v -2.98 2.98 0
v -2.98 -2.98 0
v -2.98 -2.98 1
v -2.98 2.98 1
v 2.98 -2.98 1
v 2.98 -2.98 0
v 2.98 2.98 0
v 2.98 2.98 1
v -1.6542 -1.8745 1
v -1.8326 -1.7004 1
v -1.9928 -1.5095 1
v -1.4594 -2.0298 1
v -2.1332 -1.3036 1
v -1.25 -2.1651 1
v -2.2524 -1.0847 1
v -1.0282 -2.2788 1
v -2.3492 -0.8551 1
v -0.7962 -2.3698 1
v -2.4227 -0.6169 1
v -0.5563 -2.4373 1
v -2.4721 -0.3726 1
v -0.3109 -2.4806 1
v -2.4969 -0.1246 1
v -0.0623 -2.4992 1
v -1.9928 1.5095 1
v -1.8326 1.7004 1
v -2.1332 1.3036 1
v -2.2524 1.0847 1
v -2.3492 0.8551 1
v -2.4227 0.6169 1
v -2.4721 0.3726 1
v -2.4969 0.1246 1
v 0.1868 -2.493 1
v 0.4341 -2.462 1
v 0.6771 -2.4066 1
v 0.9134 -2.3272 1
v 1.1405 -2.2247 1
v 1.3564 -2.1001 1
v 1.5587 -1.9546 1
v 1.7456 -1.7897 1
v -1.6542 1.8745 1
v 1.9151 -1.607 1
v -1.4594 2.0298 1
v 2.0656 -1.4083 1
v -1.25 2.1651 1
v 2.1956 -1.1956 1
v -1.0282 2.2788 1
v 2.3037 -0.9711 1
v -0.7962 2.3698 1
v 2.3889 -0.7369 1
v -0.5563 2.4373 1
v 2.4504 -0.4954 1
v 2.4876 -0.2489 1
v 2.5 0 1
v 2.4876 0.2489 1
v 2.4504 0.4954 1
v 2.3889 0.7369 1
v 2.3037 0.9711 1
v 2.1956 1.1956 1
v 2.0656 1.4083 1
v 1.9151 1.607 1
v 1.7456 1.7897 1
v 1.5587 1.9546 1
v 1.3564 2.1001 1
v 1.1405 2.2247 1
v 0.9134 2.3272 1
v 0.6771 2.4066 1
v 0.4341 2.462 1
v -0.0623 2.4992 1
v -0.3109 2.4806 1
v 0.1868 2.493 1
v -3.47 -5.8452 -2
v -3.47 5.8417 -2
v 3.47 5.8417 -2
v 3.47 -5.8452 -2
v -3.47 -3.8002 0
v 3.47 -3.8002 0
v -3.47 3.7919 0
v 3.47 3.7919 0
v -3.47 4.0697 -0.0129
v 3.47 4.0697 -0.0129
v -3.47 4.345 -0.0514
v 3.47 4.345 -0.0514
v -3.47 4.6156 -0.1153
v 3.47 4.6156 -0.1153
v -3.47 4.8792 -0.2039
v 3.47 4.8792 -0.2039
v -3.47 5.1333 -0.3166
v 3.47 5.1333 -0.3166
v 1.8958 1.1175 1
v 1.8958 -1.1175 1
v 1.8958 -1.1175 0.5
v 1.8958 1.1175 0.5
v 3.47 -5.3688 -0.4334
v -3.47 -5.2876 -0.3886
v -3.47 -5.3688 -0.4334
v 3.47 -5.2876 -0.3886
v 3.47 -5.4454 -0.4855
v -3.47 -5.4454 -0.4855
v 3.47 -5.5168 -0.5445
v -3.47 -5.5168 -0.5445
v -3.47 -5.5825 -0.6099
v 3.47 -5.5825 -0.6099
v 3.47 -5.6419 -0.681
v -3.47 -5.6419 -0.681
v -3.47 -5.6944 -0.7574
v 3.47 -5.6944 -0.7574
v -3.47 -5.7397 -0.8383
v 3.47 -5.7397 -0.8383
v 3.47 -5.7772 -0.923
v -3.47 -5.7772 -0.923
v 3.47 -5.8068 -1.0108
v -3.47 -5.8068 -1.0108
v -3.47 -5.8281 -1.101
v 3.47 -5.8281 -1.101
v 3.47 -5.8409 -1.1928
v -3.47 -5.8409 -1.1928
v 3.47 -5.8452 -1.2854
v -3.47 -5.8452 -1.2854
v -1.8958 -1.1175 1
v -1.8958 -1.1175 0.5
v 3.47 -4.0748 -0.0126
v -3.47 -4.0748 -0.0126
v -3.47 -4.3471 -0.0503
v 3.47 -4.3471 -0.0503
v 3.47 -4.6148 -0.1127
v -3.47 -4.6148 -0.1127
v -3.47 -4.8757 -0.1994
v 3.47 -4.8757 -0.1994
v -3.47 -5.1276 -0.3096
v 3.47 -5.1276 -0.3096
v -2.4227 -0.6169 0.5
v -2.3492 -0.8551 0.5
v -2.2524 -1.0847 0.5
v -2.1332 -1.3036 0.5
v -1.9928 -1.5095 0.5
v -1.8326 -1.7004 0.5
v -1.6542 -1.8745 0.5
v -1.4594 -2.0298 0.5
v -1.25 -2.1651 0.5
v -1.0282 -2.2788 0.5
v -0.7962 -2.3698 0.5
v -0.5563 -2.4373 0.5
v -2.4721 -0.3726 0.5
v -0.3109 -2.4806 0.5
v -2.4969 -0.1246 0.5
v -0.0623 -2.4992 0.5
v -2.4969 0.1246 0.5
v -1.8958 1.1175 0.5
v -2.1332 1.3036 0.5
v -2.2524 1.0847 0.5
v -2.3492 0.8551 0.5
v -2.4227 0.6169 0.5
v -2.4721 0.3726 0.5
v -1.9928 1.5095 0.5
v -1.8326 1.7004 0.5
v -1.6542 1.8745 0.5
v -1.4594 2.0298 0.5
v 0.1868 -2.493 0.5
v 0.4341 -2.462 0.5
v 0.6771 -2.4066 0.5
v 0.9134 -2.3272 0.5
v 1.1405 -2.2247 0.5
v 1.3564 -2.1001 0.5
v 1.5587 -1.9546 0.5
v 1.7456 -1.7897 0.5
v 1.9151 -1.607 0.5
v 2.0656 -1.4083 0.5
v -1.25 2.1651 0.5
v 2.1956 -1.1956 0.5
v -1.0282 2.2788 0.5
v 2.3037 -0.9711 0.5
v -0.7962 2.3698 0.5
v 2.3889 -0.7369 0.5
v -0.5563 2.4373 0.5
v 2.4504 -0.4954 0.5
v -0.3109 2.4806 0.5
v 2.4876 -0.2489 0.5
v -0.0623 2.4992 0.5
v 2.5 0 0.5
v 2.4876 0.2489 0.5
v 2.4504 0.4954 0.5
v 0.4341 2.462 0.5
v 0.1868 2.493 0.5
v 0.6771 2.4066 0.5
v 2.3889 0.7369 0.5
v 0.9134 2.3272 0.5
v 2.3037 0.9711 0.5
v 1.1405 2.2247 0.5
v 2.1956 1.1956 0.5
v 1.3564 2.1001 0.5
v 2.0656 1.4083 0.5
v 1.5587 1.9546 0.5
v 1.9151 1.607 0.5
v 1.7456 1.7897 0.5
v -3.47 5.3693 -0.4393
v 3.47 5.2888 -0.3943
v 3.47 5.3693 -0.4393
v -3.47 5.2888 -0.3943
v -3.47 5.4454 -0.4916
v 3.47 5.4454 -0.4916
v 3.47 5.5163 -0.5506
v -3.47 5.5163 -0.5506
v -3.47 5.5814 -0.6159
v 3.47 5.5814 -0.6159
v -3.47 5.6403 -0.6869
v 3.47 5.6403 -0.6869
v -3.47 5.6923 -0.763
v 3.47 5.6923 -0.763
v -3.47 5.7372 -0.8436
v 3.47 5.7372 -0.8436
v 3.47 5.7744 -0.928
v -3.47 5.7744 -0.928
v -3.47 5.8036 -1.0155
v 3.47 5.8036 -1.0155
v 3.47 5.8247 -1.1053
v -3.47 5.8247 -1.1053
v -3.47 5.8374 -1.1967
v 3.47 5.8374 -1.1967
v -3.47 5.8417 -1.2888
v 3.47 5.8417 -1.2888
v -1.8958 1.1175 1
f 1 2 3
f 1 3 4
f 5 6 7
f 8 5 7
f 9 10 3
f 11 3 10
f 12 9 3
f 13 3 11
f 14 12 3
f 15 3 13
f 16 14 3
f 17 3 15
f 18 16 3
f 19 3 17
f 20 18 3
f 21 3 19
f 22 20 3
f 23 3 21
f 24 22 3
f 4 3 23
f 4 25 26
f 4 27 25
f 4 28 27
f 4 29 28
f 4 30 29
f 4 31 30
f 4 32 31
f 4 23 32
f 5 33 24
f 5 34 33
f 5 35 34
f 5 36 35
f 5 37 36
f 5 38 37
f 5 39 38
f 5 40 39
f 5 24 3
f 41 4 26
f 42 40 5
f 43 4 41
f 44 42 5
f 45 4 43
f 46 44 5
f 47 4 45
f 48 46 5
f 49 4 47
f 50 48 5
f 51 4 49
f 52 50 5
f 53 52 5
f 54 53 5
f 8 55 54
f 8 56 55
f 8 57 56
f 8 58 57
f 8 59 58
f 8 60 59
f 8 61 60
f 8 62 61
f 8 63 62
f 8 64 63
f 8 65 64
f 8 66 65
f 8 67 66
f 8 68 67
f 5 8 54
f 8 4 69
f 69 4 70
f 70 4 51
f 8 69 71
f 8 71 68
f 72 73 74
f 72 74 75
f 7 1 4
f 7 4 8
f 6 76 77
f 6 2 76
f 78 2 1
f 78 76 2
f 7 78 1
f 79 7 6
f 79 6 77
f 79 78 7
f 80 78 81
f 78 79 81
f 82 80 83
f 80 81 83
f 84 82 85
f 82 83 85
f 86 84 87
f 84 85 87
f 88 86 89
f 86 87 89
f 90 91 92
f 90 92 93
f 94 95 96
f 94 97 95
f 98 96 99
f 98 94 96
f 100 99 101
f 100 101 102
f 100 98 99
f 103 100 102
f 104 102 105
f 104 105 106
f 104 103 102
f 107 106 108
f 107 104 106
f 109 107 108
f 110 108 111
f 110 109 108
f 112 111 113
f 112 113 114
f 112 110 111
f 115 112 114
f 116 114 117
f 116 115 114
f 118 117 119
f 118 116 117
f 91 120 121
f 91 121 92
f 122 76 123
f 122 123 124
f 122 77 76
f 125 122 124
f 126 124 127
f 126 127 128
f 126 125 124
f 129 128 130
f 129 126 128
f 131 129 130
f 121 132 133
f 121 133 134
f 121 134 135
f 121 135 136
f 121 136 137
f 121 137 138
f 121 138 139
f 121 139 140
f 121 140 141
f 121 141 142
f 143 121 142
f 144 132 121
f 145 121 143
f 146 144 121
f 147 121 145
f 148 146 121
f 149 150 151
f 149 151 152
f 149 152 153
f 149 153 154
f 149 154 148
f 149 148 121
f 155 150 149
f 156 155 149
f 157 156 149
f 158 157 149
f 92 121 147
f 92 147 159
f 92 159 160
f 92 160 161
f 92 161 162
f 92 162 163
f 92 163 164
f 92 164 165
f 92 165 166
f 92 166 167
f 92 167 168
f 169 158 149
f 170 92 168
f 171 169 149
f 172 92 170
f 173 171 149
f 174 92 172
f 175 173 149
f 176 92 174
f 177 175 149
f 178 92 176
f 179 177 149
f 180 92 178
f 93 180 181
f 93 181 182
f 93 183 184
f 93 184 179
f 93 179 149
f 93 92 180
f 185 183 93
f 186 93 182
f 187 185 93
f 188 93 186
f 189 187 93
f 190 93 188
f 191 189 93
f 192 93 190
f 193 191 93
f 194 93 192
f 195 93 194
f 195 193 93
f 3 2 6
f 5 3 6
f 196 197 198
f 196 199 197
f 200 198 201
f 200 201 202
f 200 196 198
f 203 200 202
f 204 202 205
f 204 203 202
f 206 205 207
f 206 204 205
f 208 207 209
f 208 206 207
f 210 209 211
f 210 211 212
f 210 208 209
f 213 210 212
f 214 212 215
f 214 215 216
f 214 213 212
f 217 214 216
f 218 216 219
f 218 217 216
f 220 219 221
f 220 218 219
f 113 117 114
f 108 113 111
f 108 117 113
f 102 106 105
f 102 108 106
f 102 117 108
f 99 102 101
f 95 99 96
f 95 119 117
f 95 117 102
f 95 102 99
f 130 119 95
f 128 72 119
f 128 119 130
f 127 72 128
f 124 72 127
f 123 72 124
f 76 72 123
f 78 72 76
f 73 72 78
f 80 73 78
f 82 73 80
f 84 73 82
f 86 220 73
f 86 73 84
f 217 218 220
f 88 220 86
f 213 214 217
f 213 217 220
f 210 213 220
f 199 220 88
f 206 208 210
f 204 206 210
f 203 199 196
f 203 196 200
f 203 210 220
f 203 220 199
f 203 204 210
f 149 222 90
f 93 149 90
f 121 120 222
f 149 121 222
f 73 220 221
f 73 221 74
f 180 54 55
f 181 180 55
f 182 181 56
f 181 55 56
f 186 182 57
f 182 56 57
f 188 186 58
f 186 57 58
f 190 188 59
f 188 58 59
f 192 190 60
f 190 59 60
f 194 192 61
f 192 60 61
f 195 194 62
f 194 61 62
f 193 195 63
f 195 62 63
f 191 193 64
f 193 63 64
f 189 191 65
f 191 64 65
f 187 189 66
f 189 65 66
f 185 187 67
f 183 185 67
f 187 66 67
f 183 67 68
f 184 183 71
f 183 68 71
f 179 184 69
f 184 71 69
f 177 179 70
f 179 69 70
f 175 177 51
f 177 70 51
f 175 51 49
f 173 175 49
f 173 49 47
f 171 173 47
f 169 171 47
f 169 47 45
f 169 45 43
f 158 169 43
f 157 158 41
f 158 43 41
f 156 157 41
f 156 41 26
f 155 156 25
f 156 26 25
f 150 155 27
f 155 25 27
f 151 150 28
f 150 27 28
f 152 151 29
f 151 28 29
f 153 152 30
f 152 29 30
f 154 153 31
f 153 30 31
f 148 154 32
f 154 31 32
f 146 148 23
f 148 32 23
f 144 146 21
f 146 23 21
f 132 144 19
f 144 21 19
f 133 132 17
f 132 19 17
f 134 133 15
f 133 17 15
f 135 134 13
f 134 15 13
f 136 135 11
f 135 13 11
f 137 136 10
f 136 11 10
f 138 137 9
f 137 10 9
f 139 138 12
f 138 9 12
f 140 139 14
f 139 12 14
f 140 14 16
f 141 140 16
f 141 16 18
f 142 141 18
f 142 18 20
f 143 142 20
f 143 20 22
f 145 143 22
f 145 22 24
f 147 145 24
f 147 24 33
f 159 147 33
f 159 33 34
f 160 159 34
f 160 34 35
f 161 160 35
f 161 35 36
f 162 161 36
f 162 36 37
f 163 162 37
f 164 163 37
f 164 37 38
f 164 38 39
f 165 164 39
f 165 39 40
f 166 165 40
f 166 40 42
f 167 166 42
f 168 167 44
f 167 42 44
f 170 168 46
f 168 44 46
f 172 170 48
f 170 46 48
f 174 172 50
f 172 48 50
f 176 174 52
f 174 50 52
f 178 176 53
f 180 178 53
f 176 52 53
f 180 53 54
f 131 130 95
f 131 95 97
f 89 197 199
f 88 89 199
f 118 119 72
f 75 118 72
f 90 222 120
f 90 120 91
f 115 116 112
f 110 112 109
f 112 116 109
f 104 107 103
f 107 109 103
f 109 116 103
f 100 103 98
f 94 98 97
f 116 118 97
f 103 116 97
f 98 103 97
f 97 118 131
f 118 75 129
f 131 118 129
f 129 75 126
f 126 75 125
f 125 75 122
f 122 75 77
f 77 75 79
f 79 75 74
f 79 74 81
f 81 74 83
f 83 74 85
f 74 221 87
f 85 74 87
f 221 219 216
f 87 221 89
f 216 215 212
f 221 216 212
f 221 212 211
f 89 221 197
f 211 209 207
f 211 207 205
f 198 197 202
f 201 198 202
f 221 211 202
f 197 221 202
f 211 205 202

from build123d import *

# Parameters (mm, degrees)
SKETCH1_W           = 6.94
SKETCH1_H           = 9
BOSS_EXTRUDE1_DEPTH = 2
SKETCH3_W           = 6.94
SKETCH3_H           = 1.5
BOSS_EXTRUDE2_DEPTH = 1
SKETCH5_W           = 6.94
SKETCH5_H           = 1.5
BOSS_EXTRUDE3_DEPTH = 1
BOSS_EXTRUDE4_DEPTH = 6.94
FILLET4_R           = 3
FILLET5_R           = 1
FILLET6_R           = 3
FILLET7_R           = 1
SKETCH1_4_W         = 5.96
SKETCH1_4_H         = 5.96
BOSS_EXTRUDE5_DEPTH = 1
SKETCH8_R           = 2.5
CUT_EXTRUDE1_DEPTH  = 0.5
SKETCH8_3_W         = 3.79167841
SKETCH8_3_H         = 2.234967368
BOSS_EXTRUDE6_DEPTH = 0.5


with BuildPart() as part:
    # Sketch1 → Boss-Extrude1 (new body)
    with BuildSketch(Plane.XY):
        Rectangle(SKETCH1_W, SKETCH1_H)
    extrude(amount=-BOSS_EXTRUDE1_DEPTH)

    # Sketch3 → Boss-Extrude2 (add)
    with BuildSketch(Plane(origin=(0, 0.899682646, 1.799761941), x_dir=(-1, 0, 0), z_dir=(0, -0.4471347413551615, -0.8944666137275626))):
        with Locations((0, 4.775099762)):
            Rectangle(SKETCH3_W, SKETCH3_H)
    extrude(amount=BOSS_EXTRUDE2_DEPTH)

    # Sketch5 → Boss-Extrude3 (add)
    with BuildSketch(Plane(origin=(0, -0.880909966, 1.785523027), x_dir=(1, 0, 0), z_dir=(0, -0.4424452173048707, 0.8967955339340434))):
        with Locations((0, -4.785579903)):
            Rectangle(SKETCH5_W, SKETCH5_H)
    extrude(amount=-BOSS_EXTRUDE3_DEPTH)

    # Sketch7 → Boss-Extrude4 (add)
    with BuildSketch(Plane.ZY.offset(3.47)):
        Polygon((-2, 4.5), (-1.117984713, 4.5), (-1.565168726, 5.394565179), (-0.670702112, 5.841699921), (-2, 5.841699921), align=None)
        Polygon((-2, -4.5), (-1.115081378, -4.5), (-1.56046336, -5.402748084), (-0.663667826, -5.845193301), (-2, -5.845193301), align=None)
    extrude(amount=-BOSS_EXTRUDE4_DEPTH)

    # Fillet4
    fillet4_edges = [part.edges().sort_by_distance(p)[0] for p in [
        (0, -4.5, 0),
    ]]
    fillet(fillet4_edges, radius=FILLET4_R)

    # Fillet5
    fillet5_edges = [part.edges().sort_by_distance(p)[0] for p in [
        (0, -5.845193301, -0.663667826),
    ]]
    fillet(fillet5_edges, radius=FILLET5_R)

    # Fillet6
    fillet6_edges = [part.edges().sort_by_distance(p)[0] for p in [
        (0, 4.5, 0),
    ]]
    fillet(fillet6_edges, radius=FILLET6_R)

    # Fillet7
    fillet7_edges = [part.edges().sort_by_distance(p)[0] for p in [
        (0, 5.841699921, -0.670702112),
    ]]
    fillet(fillet7_edges, radius=FILLET7_R)

    # Sketch1<4> → Boss-Extrude5 (add)
    with BuildSketch(Plane.XY):
        Rectangle(SKETCH1_4_W, SKETCH1_4_H)
    extrude(amount=BOSS_EXTRUDE5_DEPTH)

    # Sketch8 → Cut-Extrude1 (cut)
    with BuildSketch(Plane.XY.offset(1)):
        Circle(SKETCH8_R)
    extrude(amount=-CUT_EXTRUDE1_DEPTH, mode=Mode.SUBTRACT)

    # Sketch8<3> → Boss-Extrude6 (add)
    with BuildSketch(Plane.XY.offset(1)):
        Rectangle(SKETCH8_3_W, SKETCH8_3_H)
    extrude(amount=-BOSS_EXTRUDE6_DEPTH)


solid = part.part
